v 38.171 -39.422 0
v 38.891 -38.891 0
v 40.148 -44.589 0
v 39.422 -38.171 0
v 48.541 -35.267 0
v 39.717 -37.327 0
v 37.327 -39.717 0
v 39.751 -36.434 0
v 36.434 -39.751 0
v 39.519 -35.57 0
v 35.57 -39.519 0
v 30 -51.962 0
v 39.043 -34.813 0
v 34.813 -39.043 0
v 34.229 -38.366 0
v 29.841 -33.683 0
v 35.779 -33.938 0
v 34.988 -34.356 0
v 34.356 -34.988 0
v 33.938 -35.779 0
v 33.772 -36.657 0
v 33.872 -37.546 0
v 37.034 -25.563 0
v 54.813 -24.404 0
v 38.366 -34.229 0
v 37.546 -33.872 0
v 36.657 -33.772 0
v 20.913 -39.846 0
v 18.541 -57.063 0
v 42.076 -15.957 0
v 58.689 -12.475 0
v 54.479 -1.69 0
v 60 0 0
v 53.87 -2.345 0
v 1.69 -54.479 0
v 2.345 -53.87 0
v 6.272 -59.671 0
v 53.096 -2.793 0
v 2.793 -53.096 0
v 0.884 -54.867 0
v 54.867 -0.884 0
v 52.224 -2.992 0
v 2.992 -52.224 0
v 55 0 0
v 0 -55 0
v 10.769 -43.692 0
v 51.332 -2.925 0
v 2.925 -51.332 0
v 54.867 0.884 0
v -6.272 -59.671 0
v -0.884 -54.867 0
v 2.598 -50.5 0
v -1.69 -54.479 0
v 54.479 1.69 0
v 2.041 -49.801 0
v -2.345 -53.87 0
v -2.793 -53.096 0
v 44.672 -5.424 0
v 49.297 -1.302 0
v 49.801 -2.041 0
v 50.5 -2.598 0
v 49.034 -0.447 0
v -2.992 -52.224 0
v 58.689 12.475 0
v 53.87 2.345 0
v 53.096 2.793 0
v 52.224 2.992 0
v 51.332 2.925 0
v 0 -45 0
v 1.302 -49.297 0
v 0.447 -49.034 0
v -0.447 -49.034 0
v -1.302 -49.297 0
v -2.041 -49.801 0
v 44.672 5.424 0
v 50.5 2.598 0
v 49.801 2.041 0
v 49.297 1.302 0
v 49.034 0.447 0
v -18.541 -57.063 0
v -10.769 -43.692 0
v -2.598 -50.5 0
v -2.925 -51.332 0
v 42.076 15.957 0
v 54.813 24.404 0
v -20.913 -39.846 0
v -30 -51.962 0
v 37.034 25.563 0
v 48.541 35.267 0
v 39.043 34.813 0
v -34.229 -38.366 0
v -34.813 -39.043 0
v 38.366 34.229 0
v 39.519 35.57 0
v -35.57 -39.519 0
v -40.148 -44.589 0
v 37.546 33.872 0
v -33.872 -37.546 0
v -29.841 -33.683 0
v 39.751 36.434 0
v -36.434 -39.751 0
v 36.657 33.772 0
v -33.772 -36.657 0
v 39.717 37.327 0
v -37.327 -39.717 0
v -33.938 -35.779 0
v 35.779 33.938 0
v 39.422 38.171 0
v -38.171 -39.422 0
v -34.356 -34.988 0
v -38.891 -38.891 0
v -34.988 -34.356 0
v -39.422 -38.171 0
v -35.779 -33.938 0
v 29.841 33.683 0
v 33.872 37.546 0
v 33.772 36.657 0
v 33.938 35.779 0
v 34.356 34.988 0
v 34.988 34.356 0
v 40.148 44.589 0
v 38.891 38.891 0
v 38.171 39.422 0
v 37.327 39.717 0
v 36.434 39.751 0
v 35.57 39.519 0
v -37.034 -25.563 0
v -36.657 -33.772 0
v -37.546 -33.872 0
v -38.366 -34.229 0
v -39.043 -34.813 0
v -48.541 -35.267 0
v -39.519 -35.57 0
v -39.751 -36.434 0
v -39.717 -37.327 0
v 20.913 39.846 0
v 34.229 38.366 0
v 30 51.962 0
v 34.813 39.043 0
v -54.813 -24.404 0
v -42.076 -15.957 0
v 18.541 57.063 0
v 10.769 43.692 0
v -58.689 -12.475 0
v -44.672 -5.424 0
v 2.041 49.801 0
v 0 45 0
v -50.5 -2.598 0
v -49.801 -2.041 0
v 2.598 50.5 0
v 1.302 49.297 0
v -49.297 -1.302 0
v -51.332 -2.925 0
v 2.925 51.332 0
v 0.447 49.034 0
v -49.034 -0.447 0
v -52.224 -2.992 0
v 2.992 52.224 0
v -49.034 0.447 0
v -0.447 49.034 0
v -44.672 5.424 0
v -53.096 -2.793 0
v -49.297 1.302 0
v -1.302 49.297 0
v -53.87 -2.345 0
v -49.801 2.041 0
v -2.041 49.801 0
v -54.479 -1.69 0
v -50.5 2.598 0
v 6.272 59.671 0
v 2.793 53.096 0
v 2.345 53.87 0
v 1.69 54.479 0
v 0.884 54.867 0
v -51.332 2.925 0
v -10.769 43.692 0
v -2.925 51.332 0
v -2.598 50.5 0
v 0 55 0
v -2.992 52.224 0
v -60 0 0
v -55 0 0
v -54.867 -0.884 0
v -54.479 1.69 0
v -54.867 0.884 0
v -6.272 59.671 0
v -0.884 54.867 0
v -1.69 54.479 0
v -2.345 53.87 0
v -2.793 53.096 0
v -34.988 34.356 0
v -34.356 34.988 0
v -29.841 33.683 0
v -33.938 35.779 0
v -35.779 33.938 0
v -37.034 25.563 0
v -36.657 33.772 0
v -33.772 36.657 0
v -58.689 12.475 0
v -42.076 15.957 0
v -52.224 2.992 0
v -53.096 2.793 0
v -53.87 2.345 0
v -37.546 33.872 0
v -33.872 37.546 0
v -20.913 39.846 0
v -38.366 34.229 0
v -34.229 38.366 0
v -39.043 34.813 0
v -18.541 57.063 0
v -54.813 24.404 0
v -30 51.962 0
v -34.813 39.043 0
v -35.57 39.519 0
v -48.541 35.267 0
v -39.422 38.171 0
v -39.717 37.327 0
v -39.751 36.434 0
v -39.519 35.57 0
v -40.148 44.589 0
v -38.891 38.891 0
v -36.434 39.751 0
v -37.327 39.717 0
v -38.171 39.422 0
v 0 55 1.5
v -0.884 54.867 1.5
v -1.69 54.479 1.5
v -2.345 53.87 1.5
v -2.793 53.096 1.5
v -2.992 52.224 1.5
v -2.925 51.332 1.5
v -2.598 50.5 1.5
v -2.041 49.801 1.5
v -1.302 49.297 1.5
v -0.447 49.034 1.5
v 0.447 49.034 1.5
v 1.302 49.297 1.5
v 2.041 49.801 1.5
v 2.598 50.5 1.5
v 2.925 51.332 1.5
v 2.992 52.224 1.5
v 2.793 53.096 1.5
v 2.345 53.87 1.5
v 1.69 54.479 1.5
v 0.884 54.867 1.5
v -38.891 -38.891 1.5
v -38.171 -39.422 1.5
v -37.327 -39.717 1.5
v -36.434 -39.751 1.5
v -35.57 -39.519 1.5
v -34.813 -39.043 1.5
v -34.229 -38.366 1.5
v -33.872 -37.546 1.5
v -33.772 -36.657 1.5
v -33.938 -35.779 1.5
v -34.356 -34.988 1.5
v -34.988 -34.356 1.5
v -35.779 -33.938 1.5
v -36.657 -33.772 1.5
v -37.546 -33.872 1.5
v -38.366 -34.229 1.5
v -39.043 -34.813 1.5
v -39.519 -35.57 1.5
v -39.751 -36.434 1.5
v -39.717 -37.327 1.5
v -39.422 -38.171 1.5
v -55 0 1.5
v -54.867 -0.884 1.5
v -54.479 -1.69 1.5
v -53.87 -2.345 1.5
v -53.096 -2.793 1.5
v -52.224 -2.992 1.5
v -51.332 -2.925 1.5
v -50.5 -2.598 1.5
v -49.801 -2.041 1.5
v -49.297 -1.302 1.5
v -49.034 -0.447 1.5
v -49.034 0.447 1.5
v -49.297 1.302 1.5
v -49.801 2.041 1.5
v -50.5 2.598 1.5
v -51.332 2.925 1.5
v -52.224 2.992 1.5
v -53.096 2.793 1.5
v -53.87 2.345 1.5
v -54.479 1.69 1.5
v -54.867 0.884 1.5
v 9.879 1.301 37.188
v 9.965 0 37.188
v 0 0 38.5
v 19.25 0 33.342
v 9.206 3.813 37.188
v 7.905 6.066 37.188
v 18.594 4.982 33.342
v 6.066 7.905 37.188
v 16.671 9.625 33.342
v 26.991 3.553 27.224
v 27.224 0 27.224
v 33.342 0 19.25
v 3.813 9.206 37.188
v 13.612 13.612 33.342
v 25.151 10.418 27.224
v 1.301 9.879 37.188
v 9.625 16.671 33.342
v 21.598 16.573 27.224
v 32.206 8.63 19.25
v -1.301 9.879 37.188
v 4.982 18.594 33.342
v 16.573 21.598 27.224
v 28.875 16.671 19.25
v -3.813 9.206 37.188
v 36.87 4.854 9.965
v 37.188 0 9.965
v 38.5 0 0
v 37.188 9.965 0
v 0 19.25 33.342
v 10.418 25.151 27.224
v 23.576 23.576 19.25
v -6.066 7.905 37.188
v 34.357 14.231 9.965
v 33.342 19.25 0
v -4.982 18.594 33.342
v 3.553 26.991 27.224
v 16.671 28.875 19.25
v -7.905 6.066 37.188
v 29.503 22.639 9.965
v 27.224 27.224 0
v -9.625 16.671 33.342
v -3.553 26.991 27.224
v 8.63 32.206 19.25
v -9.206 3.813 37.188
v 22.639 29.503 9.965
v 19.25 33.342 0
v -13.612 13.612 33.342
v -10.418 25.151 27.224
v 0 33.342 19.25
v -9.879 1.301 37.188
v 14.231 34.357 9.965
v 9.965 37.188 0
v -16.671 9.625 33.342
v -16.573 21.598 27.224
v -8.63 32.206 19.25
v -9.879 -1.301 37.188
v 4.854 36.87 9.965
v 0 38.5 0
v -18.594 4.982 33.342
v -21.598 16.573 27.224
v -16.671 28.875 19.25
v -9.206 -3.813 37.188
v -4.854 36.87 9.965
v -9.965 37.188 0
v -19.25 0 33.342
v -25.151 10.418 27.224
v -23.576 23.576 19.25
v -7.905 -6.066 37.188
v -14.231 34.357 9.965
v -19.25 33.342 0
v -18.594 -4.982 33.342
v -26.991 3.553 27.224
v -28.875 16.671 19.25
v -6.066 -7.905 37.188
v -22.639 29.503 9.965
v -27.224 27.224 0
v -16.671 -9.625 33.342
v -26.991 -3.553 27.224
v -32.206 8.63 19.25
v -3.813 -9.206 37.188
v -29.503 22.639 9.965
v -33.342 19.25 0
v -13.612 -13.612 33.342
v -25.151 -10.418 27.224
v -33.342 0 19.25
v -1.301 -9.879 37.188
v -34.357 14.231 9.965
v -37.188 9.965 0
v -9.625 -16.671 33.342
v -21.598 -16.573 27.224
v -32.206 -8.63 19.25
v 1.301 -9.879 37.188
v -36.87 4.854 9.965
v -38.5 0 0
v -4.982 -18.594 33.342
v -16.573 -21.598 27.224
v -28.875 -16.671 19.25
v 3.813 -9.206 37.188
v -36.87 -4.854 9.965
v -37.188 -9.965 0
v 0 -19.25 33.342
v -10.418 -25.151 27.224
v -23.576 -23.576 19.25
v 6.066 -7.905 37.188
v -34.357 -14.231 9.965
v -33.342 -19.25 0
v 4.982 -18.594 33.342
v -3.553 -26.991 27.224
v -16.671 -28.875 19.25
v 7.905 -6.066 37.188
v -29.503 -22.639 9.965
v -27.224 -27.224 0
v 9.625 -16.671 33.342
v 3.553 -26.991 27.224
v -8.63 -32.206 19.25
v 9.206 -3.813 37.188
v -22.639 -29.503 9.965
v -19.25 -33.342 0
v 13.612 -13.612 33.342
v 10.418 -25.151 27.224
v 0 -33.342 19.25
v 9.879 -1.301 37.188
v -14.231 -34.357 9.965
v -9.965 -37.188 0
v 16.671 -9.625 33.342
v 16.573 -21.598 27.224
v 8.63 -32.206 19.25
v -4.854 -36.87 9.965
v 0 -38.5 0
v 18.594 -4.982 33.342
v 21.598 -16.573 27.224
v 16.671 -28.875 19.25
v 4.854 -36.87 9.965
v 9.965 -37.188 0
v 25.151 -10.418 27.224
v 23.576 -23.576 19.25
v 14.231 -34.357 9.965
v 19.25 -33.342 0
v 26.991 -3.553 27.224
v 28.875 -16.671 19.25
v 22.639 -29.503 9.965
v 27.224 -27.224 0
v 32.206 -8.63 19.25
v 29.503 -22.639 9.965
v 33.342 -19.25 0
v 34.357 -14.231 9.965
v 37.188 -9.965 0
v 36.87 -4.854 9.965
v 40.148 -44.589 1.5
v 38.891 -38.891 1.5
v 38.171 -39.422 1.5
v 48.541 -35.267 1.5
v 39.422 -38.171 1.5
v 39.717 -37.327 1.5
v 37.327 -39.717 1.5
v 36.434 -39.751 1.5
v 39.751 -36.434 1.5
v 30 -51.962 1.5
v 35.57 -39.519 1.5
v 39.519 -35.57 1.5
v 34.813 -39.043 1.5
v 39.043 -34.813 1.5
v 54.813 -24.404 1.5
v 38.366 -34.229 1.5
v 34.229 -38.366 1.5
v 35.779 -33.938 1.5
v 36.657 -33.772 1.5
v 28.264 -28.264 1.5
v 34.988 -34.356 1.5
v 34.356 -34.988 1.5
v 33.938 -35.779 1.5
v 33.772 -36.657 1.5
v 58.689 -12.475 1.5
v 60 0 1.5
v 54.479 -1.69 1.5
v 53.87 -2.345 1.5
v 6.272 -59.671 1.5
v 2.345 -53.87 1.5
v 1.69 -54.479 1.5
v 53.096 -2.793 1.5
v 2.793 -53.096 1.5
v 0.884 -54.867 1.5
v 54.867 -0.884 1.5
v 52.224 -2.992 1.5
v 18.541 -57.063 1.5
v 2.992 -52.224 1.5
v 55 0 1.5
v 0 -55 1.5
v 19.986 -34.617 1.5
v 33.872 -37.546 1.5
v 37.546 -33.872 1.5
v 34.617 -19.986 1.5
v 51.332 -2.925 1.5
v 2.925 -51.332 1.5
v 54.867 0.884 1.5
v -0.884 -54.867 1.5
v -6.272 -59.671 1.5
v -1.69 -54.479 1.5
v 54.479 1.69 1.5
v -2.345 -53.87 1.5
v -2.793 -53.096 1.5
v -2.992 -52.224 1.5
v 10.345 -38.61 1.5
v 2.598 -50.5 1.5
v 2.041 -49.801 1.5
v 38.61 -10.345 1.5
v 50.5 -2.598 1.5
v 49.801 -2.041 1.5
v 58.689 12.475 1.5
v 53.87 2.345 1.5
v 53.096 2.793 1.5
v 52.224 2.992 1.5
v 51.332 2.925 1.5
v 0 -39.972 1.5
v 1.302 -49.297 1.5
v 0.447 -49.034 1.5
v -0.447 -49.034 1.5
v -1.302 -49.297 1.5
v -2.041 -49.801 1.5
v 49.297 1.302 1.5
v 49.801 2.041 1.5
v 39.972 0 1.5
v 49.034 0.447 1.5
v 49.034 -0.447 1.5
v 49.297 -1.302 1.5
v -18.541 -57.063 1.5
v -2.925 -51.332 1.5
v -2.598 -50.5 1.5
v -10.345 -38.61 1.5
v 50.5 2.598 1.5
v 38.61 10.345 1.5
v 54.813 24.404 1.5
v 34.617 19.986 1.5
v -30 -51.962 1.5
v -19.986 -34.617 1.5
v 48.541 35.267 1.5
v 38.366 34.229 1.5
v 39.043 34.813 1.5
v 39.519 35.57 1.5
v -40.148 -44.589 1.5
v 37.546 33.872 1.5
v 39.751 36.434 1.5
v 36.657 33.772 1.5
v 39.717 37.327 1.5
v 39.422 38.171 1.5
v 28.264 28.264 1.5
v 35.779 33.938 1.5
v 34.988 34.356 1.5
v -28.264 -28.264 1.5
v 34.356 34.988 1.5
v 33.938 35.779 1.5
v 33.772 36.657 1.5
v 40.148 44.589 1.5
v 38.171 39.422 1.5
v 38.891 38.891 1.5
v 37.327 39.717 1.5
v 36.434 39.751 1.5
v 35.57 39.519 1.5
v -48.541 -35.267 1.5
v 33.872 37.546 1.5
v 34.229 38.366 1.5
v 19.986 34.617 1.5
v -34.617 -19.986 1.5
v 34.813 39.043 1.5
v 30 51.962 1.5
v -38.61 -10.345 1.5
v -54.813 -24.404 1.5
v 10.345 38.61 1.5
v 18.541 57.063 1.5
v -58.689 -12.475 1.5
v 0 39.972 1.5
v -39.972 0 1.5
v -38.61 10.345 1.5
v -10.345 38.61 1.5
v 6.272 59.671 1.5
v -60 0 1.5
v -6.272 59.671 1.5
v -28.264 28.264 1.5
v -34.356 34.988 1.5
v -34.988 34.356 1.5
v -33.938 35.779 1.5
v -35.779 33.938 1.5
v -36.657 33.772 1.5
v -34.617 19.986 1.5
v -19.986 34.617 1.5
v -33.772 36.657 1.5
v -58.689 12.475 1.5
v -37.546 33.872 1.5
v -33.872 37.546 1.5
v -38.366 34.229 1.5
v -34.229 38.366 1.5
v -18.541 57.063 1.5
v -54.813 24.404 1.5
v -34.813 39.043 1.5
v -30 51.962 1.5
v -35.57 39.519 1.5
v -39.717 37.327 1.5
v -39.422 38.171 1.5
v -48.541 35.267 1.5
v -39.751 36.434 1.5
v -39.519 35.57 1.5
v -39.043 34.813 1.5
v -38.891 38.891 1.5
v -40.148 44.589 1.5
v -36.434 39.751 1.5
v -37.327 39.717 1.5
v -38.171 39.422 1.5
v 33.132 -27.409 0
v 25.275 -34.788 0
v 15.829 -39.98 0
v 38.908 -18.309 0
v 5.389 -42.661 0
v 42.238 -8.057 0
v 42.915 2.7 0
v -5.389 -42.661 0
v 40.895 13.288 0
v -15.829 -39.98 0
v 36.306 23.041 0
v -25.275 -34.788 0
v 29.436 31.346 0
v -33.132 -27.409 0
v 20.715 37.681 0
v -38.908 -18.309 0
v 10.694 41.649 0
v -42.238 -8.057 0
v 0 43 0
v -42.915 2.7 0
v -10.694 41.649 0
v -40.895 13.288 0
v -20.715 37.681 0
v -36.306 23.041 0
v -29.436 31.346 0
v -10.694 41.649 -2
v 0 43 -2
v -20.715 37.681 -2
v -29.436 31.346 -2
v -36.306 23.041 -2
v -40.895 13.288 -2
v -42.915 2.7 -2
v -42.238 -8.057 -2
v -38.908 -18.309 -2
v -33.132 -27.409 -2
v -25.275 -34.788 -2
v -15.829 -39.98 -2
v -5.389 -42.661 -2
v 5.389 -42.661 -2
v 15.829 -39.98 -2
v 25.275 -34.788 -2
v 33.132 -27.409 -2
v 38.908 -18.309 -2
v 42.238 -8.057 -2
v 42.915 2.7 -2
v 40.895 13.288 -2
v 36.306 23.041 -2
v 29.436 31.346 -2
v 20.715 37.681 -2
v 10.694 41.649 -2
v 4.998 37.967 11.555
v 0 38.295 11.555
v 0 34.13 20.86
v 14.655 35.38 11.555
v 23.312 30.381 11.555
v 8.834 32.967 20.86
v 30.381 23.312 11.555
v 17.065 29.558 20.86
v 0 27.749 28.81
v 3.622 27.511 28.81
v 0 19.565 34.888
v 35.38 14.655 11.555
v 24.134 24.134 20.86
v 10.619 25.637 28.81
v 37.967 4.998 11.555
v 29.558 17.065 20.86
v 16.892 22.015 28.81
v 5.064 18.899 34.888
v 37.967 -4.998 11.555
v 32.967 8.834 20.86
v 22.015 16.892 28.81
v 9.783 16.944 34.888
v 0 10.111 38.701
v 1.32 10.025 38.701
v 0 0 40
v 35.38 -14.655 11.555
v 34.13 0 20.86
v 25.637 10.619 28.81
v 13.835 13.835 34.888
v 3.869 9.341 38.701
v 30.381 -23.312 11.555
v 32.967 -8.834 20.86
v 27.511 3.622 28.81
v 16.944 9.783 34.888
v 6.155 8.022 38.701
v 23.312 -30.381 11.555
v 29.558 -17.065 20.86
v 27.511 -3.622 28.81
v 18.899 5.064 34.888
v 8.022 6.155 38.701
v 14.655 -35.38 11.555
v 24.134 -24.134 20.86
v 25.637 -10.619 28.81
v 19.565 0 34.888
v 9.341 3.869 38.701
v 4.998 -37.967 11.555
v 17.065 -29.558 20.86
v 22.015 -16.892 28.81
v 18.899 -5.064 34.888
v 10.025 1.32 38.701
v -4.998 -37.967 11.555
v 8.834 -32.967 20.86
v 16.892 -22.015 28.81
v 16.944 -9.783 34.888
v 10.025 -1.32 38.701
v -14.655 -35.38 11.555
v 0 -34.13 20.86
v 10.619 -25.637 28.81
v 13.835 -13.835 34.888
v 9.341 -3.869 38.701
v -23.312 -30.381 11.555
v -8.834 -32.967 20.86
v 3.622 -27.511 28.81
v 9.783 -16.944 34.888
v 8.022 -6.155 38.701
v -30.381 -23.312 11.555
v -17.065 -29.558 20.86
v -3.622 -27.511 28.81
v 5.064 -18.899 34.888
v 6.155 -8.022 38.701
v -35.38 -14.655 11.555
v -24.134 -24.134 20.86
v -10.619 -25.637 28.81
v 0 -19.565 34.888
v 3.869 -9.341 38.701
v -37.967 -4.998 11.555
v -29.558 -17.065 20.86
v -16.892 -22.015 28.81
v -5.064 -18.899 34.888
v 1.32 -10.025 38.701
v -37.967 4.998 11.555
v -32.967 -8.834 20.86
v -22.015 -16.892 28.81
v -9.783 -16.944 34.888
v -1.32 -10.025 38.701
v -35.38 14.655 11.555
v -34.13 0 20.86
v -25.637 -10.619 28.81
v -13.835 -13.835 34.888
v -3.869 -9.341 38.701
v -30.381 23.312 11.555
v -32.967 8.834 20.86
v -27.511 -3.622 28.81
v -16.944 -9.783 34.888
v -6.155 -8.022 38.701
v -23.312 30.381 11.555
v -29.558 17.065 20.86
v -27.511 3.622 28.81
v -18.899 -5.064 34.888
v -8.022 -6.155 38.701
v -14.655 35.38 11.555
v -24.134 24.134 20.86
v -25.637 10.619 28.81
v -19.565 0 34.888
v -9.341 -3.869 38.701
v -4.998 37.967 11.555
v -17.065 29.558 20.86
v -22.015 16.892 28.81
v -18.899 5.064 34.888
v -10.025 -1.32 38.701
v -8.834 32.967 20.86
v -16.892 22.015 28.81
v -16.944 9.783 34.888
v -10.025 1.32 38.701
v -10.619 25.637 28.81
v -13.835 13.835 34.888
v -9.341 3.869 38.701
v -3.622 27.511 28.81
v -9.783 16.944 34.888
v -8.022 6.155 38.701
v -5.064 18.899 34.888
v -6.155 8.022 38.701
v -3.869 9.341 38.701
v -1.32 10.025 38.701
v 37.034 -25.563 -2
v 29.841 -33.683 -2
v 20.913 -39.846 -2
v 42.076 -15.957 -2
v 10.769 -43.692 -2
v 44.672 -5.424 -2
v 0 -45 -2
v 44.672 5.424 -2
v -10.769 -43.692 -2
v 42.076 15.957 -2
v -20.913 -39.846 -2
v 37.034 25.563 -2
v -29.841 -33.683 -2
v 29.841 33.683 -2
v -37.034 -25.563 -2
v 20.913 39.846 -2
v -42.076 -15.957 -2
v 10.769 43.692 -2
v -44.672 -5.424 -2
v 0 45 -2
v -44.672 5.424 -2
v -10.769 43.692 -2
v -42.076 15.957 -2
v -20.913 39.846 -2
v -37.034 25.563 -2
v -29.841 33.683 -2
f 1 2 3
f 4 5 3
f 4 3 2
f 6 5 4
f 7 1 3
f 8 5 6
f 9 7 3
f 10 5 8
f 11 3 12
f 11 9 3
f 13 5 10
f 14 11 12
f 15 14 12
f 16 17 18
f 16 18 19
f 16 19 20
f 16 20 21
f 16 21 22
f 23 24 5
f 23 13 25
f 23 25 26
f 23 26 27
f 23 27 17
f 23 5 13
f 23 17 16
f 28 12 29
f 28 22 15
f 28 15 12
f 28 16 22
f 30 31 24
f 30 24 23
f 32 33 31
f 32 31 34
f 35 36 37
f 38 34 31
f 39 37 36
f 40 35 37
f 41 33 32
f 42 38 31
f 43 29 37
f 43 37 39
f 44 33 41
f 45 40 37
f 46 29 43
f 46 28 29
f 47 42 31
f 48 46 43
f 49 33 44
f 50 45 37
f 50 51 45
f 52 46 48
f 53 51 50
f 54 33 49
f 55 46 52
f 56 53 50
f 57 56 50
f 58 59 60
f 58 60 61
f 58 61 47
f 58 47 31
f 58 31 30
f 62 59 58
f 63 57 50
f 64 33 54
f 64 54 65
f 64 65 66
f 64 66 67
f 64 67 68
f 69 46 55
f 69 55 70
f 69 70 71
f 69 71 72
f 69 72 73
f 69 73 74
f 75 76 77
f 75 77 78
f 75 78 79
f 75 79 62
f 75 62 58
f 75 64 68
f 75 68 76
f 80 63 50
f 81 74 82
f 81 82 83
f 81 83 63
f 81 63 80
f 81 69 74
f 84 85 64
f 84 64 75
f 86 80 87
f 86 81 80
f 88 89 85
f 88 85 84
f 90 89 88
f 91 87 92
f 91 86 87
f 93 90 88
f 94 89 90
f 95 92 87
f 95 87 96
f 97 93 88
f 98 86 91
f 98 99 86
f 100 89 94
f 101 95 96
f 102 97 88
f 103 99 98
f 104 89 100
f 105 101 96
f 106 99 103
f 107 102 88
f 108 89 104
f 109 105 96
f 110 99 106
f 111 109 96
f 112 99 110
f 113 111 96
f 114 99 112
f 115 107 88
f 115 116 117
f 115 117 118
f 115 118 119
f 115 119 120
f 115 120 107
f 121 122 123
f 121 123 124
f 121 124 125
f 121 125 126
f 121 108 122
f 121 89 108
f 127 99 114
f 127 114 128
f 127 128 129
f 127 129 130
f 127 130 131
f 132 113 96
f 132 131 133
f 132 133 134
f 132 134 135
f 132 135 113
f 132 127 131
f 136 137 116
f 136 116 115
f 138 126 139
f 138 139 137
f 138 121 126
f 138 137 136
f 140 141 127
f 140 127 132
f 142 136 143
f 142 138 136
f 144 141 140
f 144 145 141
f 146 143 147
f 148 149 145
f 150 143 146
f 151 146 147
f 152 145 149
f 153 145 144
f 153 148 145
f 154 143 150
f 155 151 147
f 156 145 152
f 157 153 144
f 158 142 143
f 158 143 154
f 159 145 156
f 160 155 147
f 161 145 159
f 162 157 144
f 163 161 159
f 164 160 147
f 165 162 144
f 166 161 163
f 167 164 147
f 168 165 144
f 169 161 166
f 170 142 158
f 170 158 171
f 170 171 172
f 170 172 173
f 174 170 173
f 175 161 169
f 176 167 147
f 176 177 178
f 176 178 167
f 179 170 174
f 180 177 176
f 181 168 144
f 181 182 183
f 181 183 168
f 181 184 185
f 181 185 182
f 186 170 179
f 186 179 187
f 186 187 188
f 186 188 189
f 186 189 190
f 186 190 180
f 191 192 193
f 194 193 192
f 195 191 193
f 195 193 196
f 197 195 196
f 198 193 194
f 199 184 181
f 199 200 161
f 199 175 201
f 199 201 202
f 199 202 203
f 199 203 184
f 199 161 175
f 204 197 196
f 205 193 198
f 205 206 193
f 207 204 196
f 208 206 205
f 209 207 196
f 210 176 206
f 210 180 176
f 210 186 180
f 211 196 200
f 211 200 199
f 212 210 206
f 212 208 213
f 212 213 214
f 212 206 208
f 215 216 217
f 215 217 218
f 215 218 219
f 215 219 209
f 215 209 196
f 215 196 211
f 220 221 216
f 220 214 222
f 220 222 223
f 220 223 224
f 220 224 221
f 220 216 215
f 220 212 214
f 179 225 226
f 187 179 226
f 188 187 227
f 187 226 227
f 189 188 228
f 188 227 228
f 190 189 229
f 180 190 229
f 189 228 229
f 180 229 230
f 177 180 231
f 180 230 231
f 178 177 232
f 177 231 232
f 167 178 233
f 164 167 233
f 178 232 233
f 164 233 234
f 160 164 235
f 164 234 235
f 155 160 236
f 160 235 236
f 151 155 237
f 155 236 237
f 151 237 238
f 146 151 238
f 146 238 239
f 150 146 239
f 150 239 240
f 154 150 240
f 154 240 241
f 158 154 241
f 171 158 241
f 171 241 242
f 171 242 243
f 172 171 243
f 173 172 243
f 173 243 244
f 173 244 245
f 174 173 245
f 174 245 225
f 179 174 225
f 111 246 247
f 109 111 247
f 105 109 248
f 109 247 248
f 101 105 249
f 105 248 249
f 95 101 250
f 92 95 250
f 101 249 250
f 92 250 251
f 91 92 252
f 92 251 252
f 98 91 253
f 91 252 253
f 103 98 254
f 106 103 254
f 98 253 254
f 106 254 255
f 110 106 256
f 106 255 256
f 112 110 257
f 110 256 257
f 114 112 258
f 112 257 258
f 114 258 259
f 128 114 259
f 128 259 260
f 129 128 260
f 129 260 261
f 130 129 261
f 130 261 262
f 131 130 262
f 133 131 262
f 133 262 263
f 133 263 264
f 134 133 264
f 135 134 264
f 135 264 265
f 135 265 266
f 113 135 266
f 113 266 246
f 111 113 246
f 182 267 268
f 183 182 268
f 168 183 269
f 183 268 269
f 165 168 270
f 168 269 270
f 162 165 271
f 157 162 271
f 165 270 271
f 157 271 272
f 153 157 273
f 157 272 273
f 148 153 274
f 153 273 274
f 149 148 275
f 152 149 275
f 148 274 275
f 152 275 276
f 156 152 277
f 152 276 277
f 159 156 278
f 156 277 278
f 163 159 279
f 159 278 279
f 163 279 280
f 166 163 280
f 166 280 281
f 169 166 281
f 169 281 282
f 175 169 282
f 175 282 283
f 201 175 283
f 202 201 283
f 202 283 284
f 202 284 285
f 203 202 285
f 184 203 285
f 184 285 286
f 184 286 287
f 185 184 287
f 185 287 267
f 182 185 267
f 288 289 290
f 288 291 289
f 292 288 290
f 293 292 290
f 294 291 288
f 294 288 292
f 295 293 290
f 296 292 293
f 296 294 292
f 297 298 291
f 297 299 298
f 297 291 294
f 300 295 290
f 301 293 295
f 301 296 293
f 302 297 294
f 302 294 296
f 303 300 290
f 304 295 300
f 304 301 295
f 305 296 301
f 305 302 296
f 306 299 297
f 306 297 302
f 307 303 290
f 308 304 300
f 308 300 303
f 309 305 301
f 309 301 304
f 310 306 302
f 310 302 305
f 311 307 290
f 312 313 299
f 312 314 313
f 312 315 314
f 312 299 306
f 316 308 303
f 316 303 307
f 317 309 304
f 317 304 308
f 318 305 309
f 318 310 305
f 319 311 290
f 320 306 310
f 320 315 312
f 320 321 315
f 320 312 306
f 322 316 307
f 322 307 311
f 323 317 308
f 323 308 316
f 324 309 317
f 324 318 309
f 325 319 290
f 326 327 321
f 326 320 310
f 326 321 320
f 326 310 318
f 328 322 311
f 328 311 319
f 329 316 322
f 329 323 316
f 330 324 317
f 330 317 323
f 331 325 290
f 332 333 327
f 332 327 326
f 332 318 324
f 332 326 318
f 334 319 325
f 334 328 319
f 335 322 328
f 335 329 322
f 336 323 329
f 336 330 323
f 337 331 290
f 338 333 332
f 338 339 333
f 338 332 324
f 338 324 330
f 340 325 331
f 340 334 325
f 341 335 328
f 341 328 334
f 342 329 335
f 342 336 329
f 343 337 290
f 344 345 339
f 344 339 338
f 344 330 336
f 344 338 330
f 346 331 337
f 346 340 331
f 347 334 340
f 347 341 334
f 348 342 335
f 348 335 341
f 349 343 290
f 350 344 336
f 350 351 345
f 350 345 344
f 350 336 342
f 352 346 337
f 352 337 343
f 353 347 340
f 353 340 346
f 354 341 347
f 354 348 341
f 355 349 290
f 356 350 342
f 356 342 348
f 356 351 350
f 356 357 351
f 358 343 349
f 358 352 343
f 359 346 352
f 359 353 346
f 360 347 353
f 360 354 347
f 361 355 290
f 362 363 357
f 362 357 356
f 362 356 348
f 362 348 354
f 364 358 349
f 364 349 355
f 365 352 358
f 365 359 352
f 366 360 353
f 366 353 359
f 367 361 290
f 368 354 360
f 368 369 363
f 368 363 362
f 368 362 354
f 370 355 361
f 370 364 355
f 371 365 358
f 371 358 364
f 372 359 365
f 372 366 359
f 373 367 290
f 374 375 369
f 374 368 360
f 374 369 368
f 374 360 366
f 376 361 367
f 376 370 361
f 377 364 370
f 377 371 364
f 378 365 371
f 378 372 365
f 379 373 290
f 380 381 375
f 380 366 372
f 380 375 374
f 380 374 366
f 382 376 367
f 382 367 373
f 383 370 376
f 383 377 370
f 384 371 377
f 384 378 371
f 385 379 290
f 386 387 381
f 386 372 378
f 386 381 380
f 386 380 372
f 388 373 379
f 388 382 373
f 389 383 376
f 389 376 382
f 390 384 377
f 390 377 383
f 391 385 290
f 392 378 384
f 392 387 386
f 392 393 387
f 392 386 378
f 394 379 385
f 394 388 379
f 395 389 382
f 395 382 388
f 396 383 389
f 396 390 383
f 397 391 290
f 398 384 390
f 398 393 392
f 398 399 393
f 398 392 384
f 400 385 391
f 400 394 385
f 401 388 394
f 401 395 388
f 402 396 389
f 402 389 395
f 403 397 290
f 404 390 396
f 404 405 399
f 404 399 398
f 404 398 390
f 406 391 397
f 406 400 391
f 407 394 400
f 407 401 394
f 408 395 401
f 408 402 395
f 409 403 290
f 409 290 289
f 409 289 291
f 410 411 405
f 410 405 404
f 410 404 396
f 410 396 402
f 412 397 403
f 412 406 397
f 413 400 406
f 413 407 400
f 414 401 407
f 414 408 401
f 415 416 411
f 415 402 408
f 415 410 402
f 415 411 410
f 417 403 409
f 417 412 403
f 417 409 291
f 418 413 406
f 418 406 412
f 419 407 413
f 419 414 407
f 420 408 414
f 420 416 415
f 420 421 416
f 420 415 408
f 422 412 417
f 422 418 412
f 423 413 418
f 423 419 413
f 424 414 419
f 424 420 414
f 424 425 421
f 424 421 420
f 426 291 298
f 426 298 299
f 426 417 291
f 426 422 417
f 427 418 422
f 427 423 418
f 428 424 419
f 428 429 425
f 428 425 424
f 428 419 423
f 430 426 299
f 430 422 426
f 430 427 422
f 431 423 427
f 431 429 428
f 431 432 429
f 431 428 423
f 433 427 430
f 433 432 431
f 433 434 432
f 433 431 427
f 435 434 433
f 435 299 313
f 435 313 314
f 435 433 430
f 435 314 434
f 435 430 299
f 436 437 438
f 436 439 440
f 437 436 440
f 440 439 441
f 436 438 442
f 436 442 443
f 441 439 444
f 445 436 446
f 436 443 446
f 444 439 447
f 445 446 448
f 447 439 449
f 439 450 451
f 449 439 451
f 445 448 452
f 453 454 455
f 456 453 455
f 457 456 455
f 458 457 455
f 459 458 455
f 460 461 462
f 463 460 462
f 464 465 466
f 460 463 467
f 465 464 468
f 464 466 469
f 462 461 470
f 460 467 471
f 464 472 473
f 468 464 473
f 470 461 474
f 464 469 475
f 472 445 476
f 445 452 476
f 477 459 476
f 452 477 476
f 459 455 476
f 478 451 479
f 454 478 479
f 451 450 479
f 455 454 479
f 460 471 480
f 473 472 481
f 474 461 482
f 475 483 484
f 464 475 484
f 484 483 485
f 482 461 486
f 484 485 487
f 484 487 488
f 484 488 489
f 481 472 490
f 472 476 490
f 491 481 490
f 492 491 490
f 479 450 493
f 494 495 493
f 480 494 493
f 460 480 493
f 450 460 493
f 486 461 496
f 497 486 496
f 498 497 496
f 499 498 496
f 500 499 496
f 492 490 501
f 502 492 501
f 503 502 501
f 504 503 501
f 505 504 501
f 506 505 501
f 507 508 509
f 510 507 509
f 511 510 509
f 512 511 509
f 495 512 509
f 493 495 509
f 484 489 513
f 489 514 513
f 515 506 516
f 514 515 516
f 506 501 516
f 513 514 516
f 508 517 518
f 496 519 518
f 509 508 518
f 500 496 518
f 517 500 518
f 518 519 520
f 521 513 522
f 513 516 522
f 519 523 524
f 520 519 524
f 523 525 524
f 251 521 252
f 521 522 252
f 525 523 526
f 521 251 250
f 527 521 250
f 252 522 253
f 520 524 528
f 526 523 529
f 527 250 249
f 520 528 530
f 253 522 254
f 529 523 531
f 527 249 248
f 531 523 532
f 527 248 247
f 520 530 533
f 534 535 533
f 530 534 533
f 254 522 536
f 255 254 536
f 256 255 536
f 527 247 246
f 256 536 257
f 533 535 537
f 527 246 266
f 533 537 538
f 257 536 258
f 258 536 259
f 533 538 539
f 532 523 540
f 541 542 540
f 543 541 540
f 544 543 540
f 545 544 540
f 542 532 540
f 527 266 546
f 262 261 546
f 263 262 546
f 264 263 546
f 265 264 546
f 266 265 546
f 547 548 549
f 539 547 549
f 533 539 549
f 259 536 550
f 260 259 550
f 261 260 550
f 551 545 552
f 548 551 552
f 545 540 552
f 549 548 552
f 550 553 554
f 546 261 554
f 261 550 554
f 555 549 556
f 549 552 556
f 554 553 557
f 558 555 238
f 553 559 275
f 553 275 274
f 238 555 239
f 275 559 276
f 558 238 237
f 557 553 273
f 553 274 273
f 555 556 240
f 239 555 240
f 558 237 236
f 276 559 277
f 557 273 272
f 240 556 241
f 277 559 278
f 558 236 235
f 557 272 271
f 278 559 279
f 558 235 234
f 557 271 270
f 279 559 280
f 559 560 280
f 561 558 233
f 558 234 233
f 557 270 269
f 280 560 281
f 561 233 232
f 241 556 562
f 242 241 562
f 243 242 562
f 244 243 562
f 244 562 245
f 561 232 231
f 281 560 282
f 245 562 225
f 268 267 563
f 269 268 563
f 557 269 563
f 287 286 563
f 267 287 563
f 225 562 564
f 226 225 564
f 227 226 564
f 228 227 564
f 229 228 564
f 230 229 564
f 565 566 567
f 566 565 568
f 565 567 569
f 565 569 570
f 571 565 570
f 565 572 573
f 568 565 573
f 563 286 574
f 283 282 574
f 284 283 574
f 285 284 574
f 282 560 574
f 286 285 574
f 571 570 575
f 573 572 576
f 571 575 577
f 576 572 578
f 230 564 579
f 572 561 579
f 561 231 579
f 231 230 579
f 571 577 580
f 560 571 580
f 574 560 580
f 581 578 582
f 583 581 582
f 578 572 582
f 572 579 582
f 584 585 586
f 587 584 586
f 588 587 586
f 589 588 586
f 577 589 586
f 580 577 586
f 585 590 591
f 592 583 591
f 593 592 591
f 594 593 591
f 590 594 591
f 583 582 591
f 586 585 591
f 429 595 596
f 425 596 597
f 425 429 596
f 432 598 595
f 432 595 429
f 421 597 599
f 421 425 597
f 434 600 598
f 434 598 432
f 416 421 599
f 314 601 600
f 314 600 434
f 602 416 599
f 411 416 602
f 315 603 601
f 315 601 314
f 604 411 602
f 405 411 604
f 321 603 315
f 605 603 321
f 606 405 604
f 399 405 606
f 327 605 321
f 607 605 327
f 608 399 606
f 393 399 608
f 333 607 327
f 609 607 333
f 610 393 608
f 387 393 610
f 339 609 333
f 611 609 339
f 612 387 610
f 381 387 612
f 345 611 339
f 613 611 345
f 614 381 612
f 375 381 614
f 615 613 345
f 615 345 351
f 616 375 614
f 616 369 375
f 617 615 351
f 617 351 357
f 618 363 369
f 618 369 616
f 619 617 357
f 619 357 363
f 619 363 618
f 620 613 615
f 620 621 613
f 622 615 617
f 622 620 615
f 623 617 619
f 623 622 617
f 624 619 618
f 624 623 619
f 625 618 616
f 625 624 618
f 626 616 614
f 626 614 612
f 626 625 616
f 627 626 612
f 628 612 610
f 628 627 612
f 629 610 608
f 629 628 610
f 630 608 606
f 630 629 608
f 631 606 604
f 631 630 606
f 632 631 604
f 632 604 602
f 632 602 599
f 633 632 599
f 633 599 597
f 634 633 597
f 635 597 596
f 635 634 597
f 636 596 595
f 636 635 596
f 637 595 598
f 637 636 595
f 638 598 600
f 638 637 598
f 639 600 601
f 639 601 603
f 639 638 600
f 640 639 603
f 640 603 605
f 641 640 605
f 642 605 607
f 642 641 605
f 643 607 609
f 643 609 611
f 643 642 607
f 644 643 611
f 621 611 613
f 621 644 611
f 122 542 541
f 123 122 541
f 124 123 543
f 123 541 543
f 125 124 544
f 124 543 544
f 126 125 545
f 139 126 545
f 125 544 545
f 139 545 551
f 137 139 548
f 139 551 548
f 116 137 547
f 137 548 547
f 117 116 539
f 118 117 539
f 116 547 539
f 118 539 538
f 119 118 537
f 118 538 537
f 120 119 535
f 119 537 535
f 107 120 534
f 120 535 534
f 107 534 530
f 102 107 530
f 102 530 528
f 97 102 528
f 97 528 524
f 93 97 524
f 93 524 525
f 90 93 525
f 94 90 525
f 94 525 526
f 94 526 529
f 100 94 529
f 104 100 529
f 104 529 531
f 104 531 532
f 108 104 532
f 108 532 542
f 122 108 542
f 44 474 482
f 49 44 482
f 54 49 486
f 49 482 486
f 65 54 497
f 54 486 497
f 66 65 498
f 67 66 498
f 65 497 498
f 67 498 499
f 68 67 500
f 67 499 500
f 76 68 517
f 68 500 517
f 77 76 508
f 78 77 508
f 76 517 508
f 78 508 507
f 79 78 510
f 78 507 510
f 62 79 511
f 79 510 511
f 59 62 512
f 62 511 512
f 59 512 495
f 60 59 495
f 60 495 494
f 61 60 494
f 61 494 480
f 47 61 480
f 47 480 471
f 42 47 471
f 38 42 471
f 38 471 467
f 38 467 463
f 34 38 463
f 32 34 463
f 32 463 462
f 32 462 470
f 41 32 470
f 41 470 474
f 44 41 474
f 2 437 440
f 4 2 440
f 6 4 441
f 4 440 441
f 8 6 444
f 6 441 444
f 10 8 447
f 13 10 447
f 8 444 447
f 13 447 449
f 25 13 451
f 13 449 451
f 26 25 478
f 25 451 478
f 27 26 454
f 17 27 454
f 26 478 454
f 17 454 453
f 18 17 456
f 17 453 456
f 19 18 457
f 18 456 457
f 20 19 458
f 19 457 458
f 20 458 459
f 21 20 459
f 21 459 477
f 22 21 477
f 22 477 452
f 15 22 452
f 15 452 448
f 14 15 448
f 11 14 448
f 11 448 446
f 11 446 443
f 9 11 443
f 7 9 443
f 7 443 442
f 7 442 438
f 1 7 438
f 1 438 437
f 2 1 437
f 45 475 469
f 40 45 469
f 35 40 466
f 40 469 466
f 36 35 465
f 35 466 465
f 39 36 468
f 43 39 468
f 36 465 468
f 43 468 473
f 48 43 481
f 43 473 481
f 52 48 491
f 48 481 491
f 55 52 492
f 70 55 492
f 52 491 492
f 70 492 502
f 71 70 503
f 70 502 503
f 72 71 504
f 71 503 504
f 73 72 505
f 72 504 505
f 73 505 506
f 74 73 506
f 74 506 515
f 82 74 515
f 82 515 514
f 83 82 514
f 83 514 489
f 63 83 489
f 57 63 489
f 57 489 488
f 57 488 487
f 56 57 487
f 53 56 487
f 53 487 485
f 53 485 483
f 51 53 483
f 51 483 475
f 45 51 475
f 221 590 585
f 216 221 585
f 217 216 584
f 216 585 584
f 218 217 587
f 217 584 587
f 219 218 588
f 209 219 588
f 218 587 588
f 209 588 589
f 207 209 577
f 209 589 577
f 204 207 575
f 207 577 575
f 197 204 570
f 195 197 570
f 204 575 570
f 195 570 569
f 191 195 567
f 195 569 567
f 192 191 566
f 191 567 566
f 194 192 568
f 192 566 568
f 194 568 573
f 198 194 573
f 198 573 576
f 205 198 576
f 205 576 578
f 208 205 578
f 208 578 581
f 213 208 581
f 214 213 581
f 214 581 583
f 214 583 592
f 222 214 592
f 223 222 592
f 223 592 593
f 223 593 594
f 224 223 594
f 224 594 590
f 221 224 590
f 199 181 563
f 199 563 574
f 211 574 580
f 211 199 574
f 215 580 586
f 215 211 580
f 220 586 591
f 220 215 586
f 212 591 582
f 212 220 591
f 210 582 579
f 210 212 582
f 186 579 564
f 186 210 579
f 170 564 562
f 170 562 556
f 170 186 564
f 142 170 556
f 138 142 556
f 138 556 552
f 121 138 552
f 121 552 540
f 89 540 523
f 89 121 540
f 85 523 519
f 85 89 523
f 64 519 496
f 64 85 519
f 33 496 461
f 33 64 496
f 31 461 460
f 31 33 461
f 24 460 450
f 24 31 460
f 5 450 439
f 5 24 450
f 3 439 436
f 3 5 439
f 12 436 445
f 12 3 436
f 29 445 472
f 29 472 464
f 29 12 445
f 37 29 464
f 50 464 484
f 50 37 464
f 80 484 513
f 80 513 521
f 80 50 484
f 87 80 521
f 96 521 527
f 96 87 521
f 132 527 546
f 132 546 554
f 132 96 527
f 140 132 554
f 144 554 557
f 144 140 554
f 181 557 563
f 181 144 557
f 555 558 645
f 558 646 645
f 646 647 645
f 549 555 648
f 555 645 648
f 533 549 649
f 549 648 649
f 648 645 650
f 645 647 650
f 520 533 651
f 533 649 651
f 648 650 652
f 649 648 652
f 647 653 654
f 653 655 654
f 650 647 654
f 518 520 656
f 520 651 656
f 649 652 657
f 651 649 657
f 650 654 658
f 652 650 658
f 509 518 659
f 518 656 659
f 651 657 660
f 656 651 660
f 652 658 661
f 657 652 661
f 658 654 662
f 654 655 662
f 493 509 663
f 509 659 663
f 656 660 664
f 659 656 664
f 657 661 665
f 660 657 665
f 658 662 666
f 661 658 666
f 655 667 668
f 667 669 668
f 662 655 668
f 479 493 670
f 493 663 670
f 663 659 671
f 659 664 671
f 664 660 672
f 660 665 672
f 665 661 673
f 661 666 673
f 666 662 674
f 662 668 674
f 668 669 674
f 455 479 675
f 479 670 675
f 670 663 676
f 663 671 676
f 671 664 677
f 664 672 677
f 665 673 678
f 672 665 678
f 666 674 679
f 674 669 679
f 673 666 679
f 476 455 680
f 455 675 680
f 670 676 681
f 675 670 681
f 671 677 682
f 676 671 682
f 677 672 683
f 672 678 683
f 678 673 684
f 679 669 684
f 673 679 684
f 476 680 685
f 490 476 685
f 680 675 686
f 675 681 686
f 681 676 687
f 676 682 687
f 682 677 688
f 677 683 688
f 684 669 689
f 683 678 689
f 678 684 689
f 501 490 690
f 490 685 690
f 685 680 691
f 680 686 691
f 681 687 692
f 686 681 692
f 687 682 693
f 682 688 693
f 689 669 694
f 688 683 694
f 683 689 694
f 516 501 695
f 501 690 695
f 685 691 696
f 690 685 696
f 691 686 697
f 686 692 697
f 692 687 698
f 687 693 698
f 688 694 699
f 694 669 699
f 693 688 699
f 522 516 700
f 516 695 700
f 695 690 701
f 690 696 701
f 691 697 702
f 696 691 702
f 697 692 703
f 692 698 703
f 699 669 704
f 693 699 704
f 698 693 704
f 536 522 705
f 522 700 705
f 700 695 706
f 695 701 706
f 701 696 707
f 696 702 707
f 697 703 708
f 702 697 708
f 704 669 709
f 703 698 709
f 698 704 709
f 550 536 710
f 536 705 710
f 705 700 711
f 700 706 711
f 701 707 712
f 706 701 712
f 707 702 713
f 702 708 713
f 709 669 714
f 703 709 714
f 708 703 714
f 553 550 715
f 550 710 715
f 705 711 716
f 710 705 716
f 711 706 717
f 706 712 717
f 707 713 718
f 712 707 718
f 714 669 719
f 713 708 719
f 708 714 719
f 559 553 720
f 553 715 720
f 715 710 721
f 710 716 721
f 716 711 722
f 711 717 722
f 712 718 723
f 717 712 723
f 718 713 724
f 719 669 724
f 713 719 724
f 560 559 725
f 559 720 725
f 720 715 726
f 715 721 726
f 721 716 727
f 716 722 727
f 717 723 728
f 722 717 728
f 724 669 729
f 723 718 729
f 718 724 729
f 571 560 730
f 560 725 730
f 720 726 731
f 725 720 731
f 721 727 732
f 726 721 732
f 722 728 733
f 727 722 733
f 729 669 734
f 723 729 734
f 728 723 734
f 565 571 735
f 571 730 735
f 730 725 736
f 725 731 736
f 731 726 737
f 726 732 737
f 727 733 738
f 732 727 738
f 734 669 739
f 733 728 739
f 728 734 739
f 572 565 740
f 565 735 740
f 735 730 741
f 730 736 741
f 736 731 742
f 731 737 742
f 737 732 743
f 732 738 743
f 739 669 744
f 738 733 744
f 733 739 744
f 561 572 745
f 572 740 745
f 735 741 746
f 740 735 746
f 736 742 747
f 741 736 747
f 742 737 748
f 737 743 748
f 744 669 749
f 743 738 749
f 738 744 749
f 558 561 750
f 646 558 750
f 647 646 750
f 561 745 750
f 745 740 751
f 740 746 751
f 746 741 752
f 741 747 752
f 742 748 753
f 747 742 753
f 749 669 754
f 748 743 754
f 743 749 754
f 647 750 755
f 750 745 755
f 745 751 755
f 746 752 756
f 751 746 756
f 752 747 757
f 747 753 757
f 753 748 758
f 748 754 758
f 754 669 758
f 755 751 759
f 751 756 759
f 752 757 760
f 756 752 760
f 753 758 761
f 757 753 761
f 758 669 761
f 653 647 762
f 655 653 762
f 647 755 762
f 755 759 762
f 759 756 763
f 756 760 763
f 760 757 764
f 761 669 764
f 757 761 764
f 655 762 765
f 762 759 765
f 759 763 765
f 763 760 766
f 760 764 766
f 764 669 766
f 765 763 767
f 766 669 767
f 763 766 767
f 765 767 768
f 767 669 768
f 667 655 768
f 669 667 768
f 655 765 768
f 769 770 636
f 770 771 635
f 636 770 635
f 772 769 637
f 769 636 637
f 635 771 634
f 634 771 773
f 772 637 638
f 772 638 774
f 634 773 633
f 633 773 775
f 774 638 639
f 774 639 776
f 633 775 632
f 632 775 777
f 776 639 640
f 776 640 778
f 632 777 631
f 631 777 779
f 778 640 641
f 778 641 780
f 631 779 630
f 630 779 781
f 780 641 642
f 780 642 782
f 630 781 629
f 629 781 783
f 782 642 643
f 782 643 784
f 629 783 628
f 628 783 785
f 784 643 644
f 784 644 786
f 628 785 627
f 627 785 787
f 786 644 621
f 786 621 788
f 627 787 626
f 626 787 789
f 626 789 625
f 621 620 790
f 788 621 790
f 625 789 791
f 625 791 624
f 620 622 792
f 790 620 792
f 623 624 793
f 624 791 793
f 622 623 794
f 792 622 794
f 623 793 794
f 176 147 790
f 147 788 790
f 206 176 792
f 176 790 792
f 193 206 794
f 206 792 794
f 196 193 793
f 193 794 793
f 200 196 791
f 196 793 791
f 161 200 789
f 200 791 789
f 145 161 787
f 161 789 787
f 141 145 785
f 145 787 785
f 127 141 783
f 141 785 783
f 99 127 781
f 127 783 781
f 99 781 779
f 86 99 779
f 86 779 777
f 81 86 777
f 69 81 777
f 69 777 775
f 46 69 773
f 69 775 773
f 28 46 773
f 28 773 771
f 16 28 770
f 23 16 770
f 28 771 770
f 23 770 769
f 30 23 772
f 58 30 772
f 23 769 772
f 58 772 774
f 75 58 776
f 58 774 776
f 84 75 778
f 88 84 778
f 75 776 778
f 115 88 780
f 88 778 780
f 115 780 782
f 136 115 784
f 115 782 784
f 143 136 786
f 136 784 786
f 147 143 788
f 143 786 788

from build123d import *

# Parameters (mm, degrees)
SKETCH_2_R               = 101.541015805
CUT_EXTRUDE_1_DEPTH      = 92
SKETCH_4_R               = 60
SKETCH_4_R_2             = 39
EXTRUDE_1_DEPTH          = 1.5
SKETCH_5_W               = 2
SKETCH_5_H               = 2
SKETCH_6_R               = 3
CUT_EXTRUDE_2_DEPTH      = 20
PATTERN_CIRCULAR_1_COUNT = 8


with BuildPart() as part:
    # 草图1 → 旋转1 (revolve)
    with BuildSketch(Plane(origin=(0, 0, 0), x_dir=(0, 0, -1), z_dir=(1, 0, 0))):
        with BuildLine():
            Line((-40, 0), (40, 0))
            ThreePointArc((40, 0), (0, 40), (-40, 0))
        make_face()
    revolve(axis=Axis((0, 0, 40), (0, 0, -1)))

    # 草图2 → 切除-拉伸1 (cut)
    with BuildSketch(Plane.XY):
        with Locations((-18.762206379, 13.237665106)):
            Circle(SKETCH_2_R)
    extrude(amount=-CUT_EXTRUDE_1_DEPTH, mode=Mode.SUBTRACT)

    # 草图3 → 切除-旋转1 (revolve, cut)
    with BuildSketch(Plane(origin=(0, 0, 0), x_dir=(1, 0, 0), z_dir=(0, 1, 0))):
        with BuildLine():
            Line((0, 38.5), (0, -38.5))
            ThreePointArc((0, -38.5), (38.5, 0), (0, 38.5))
        make_face()
    revolve(axis=Axis((0, 0, -38.5), (0, 0, 1)), mode=Mode.SUBTRACT)

    # 草图4 → 凸台-拉伸1 (add)
    with BuildSketch(Plane(origin=(0, 0, 0), x_dir=(-1, 0, 0), z_dir=(0, 0, -1))):
        Circle(SKETCH_4_R)
        Circle(SKETCH_4_R_2, mode=Mode.SUBTRACT)
    extrude(amount=-EXTRUDE_1_DEPTH)

    # 草图5 → 旋转2 (revolve)
    with BuildSketch(Plane(origin=(0, 0, 0), x_dir=(1, 0, 0), z_dir=(0, 1, 0)), mode=Mode.PRIVATE) as revolve_2_sk:
        with Locations((-44, 1)):
            Rectangle(SKETCH_5_W, SKETCH_5_H)
    revolve(revolve_2_sk.sketch.rotate(Axis((0, 0, -24.660694069), (0, 0, 1)), 270), axis=Axis((0, 0, -24.660694069), (0, 0, 1)))

    # 草图6 → 切除-拉伸2 (cut)
    with BuildSketch(Plane.XY.offset(1.5)):
        with Locations((52, 0)):
            Circle(SKETCH_6_R)
    cut_extrude_2 = extrude(amount=-CUT_EXTRUDE_2_DEPTH, mode=Mode.SUBTRACT)

    # 阵列(圆周)1: 切除-拉伸2 ×8 about axis
    pattern_circular_1_axis = Axis((0, 0, 0), (0, 0, 1))
    for i in range(1, PATTERN_CIRCULAR_1_COUNT):
        add(cut_extrude_2.rotate(pattern_circular_1_axis, i * 360 / PATTERN_CIRCULAR_1_COUNT), mode=Mode.SUBTRACT)


solid = part.part
